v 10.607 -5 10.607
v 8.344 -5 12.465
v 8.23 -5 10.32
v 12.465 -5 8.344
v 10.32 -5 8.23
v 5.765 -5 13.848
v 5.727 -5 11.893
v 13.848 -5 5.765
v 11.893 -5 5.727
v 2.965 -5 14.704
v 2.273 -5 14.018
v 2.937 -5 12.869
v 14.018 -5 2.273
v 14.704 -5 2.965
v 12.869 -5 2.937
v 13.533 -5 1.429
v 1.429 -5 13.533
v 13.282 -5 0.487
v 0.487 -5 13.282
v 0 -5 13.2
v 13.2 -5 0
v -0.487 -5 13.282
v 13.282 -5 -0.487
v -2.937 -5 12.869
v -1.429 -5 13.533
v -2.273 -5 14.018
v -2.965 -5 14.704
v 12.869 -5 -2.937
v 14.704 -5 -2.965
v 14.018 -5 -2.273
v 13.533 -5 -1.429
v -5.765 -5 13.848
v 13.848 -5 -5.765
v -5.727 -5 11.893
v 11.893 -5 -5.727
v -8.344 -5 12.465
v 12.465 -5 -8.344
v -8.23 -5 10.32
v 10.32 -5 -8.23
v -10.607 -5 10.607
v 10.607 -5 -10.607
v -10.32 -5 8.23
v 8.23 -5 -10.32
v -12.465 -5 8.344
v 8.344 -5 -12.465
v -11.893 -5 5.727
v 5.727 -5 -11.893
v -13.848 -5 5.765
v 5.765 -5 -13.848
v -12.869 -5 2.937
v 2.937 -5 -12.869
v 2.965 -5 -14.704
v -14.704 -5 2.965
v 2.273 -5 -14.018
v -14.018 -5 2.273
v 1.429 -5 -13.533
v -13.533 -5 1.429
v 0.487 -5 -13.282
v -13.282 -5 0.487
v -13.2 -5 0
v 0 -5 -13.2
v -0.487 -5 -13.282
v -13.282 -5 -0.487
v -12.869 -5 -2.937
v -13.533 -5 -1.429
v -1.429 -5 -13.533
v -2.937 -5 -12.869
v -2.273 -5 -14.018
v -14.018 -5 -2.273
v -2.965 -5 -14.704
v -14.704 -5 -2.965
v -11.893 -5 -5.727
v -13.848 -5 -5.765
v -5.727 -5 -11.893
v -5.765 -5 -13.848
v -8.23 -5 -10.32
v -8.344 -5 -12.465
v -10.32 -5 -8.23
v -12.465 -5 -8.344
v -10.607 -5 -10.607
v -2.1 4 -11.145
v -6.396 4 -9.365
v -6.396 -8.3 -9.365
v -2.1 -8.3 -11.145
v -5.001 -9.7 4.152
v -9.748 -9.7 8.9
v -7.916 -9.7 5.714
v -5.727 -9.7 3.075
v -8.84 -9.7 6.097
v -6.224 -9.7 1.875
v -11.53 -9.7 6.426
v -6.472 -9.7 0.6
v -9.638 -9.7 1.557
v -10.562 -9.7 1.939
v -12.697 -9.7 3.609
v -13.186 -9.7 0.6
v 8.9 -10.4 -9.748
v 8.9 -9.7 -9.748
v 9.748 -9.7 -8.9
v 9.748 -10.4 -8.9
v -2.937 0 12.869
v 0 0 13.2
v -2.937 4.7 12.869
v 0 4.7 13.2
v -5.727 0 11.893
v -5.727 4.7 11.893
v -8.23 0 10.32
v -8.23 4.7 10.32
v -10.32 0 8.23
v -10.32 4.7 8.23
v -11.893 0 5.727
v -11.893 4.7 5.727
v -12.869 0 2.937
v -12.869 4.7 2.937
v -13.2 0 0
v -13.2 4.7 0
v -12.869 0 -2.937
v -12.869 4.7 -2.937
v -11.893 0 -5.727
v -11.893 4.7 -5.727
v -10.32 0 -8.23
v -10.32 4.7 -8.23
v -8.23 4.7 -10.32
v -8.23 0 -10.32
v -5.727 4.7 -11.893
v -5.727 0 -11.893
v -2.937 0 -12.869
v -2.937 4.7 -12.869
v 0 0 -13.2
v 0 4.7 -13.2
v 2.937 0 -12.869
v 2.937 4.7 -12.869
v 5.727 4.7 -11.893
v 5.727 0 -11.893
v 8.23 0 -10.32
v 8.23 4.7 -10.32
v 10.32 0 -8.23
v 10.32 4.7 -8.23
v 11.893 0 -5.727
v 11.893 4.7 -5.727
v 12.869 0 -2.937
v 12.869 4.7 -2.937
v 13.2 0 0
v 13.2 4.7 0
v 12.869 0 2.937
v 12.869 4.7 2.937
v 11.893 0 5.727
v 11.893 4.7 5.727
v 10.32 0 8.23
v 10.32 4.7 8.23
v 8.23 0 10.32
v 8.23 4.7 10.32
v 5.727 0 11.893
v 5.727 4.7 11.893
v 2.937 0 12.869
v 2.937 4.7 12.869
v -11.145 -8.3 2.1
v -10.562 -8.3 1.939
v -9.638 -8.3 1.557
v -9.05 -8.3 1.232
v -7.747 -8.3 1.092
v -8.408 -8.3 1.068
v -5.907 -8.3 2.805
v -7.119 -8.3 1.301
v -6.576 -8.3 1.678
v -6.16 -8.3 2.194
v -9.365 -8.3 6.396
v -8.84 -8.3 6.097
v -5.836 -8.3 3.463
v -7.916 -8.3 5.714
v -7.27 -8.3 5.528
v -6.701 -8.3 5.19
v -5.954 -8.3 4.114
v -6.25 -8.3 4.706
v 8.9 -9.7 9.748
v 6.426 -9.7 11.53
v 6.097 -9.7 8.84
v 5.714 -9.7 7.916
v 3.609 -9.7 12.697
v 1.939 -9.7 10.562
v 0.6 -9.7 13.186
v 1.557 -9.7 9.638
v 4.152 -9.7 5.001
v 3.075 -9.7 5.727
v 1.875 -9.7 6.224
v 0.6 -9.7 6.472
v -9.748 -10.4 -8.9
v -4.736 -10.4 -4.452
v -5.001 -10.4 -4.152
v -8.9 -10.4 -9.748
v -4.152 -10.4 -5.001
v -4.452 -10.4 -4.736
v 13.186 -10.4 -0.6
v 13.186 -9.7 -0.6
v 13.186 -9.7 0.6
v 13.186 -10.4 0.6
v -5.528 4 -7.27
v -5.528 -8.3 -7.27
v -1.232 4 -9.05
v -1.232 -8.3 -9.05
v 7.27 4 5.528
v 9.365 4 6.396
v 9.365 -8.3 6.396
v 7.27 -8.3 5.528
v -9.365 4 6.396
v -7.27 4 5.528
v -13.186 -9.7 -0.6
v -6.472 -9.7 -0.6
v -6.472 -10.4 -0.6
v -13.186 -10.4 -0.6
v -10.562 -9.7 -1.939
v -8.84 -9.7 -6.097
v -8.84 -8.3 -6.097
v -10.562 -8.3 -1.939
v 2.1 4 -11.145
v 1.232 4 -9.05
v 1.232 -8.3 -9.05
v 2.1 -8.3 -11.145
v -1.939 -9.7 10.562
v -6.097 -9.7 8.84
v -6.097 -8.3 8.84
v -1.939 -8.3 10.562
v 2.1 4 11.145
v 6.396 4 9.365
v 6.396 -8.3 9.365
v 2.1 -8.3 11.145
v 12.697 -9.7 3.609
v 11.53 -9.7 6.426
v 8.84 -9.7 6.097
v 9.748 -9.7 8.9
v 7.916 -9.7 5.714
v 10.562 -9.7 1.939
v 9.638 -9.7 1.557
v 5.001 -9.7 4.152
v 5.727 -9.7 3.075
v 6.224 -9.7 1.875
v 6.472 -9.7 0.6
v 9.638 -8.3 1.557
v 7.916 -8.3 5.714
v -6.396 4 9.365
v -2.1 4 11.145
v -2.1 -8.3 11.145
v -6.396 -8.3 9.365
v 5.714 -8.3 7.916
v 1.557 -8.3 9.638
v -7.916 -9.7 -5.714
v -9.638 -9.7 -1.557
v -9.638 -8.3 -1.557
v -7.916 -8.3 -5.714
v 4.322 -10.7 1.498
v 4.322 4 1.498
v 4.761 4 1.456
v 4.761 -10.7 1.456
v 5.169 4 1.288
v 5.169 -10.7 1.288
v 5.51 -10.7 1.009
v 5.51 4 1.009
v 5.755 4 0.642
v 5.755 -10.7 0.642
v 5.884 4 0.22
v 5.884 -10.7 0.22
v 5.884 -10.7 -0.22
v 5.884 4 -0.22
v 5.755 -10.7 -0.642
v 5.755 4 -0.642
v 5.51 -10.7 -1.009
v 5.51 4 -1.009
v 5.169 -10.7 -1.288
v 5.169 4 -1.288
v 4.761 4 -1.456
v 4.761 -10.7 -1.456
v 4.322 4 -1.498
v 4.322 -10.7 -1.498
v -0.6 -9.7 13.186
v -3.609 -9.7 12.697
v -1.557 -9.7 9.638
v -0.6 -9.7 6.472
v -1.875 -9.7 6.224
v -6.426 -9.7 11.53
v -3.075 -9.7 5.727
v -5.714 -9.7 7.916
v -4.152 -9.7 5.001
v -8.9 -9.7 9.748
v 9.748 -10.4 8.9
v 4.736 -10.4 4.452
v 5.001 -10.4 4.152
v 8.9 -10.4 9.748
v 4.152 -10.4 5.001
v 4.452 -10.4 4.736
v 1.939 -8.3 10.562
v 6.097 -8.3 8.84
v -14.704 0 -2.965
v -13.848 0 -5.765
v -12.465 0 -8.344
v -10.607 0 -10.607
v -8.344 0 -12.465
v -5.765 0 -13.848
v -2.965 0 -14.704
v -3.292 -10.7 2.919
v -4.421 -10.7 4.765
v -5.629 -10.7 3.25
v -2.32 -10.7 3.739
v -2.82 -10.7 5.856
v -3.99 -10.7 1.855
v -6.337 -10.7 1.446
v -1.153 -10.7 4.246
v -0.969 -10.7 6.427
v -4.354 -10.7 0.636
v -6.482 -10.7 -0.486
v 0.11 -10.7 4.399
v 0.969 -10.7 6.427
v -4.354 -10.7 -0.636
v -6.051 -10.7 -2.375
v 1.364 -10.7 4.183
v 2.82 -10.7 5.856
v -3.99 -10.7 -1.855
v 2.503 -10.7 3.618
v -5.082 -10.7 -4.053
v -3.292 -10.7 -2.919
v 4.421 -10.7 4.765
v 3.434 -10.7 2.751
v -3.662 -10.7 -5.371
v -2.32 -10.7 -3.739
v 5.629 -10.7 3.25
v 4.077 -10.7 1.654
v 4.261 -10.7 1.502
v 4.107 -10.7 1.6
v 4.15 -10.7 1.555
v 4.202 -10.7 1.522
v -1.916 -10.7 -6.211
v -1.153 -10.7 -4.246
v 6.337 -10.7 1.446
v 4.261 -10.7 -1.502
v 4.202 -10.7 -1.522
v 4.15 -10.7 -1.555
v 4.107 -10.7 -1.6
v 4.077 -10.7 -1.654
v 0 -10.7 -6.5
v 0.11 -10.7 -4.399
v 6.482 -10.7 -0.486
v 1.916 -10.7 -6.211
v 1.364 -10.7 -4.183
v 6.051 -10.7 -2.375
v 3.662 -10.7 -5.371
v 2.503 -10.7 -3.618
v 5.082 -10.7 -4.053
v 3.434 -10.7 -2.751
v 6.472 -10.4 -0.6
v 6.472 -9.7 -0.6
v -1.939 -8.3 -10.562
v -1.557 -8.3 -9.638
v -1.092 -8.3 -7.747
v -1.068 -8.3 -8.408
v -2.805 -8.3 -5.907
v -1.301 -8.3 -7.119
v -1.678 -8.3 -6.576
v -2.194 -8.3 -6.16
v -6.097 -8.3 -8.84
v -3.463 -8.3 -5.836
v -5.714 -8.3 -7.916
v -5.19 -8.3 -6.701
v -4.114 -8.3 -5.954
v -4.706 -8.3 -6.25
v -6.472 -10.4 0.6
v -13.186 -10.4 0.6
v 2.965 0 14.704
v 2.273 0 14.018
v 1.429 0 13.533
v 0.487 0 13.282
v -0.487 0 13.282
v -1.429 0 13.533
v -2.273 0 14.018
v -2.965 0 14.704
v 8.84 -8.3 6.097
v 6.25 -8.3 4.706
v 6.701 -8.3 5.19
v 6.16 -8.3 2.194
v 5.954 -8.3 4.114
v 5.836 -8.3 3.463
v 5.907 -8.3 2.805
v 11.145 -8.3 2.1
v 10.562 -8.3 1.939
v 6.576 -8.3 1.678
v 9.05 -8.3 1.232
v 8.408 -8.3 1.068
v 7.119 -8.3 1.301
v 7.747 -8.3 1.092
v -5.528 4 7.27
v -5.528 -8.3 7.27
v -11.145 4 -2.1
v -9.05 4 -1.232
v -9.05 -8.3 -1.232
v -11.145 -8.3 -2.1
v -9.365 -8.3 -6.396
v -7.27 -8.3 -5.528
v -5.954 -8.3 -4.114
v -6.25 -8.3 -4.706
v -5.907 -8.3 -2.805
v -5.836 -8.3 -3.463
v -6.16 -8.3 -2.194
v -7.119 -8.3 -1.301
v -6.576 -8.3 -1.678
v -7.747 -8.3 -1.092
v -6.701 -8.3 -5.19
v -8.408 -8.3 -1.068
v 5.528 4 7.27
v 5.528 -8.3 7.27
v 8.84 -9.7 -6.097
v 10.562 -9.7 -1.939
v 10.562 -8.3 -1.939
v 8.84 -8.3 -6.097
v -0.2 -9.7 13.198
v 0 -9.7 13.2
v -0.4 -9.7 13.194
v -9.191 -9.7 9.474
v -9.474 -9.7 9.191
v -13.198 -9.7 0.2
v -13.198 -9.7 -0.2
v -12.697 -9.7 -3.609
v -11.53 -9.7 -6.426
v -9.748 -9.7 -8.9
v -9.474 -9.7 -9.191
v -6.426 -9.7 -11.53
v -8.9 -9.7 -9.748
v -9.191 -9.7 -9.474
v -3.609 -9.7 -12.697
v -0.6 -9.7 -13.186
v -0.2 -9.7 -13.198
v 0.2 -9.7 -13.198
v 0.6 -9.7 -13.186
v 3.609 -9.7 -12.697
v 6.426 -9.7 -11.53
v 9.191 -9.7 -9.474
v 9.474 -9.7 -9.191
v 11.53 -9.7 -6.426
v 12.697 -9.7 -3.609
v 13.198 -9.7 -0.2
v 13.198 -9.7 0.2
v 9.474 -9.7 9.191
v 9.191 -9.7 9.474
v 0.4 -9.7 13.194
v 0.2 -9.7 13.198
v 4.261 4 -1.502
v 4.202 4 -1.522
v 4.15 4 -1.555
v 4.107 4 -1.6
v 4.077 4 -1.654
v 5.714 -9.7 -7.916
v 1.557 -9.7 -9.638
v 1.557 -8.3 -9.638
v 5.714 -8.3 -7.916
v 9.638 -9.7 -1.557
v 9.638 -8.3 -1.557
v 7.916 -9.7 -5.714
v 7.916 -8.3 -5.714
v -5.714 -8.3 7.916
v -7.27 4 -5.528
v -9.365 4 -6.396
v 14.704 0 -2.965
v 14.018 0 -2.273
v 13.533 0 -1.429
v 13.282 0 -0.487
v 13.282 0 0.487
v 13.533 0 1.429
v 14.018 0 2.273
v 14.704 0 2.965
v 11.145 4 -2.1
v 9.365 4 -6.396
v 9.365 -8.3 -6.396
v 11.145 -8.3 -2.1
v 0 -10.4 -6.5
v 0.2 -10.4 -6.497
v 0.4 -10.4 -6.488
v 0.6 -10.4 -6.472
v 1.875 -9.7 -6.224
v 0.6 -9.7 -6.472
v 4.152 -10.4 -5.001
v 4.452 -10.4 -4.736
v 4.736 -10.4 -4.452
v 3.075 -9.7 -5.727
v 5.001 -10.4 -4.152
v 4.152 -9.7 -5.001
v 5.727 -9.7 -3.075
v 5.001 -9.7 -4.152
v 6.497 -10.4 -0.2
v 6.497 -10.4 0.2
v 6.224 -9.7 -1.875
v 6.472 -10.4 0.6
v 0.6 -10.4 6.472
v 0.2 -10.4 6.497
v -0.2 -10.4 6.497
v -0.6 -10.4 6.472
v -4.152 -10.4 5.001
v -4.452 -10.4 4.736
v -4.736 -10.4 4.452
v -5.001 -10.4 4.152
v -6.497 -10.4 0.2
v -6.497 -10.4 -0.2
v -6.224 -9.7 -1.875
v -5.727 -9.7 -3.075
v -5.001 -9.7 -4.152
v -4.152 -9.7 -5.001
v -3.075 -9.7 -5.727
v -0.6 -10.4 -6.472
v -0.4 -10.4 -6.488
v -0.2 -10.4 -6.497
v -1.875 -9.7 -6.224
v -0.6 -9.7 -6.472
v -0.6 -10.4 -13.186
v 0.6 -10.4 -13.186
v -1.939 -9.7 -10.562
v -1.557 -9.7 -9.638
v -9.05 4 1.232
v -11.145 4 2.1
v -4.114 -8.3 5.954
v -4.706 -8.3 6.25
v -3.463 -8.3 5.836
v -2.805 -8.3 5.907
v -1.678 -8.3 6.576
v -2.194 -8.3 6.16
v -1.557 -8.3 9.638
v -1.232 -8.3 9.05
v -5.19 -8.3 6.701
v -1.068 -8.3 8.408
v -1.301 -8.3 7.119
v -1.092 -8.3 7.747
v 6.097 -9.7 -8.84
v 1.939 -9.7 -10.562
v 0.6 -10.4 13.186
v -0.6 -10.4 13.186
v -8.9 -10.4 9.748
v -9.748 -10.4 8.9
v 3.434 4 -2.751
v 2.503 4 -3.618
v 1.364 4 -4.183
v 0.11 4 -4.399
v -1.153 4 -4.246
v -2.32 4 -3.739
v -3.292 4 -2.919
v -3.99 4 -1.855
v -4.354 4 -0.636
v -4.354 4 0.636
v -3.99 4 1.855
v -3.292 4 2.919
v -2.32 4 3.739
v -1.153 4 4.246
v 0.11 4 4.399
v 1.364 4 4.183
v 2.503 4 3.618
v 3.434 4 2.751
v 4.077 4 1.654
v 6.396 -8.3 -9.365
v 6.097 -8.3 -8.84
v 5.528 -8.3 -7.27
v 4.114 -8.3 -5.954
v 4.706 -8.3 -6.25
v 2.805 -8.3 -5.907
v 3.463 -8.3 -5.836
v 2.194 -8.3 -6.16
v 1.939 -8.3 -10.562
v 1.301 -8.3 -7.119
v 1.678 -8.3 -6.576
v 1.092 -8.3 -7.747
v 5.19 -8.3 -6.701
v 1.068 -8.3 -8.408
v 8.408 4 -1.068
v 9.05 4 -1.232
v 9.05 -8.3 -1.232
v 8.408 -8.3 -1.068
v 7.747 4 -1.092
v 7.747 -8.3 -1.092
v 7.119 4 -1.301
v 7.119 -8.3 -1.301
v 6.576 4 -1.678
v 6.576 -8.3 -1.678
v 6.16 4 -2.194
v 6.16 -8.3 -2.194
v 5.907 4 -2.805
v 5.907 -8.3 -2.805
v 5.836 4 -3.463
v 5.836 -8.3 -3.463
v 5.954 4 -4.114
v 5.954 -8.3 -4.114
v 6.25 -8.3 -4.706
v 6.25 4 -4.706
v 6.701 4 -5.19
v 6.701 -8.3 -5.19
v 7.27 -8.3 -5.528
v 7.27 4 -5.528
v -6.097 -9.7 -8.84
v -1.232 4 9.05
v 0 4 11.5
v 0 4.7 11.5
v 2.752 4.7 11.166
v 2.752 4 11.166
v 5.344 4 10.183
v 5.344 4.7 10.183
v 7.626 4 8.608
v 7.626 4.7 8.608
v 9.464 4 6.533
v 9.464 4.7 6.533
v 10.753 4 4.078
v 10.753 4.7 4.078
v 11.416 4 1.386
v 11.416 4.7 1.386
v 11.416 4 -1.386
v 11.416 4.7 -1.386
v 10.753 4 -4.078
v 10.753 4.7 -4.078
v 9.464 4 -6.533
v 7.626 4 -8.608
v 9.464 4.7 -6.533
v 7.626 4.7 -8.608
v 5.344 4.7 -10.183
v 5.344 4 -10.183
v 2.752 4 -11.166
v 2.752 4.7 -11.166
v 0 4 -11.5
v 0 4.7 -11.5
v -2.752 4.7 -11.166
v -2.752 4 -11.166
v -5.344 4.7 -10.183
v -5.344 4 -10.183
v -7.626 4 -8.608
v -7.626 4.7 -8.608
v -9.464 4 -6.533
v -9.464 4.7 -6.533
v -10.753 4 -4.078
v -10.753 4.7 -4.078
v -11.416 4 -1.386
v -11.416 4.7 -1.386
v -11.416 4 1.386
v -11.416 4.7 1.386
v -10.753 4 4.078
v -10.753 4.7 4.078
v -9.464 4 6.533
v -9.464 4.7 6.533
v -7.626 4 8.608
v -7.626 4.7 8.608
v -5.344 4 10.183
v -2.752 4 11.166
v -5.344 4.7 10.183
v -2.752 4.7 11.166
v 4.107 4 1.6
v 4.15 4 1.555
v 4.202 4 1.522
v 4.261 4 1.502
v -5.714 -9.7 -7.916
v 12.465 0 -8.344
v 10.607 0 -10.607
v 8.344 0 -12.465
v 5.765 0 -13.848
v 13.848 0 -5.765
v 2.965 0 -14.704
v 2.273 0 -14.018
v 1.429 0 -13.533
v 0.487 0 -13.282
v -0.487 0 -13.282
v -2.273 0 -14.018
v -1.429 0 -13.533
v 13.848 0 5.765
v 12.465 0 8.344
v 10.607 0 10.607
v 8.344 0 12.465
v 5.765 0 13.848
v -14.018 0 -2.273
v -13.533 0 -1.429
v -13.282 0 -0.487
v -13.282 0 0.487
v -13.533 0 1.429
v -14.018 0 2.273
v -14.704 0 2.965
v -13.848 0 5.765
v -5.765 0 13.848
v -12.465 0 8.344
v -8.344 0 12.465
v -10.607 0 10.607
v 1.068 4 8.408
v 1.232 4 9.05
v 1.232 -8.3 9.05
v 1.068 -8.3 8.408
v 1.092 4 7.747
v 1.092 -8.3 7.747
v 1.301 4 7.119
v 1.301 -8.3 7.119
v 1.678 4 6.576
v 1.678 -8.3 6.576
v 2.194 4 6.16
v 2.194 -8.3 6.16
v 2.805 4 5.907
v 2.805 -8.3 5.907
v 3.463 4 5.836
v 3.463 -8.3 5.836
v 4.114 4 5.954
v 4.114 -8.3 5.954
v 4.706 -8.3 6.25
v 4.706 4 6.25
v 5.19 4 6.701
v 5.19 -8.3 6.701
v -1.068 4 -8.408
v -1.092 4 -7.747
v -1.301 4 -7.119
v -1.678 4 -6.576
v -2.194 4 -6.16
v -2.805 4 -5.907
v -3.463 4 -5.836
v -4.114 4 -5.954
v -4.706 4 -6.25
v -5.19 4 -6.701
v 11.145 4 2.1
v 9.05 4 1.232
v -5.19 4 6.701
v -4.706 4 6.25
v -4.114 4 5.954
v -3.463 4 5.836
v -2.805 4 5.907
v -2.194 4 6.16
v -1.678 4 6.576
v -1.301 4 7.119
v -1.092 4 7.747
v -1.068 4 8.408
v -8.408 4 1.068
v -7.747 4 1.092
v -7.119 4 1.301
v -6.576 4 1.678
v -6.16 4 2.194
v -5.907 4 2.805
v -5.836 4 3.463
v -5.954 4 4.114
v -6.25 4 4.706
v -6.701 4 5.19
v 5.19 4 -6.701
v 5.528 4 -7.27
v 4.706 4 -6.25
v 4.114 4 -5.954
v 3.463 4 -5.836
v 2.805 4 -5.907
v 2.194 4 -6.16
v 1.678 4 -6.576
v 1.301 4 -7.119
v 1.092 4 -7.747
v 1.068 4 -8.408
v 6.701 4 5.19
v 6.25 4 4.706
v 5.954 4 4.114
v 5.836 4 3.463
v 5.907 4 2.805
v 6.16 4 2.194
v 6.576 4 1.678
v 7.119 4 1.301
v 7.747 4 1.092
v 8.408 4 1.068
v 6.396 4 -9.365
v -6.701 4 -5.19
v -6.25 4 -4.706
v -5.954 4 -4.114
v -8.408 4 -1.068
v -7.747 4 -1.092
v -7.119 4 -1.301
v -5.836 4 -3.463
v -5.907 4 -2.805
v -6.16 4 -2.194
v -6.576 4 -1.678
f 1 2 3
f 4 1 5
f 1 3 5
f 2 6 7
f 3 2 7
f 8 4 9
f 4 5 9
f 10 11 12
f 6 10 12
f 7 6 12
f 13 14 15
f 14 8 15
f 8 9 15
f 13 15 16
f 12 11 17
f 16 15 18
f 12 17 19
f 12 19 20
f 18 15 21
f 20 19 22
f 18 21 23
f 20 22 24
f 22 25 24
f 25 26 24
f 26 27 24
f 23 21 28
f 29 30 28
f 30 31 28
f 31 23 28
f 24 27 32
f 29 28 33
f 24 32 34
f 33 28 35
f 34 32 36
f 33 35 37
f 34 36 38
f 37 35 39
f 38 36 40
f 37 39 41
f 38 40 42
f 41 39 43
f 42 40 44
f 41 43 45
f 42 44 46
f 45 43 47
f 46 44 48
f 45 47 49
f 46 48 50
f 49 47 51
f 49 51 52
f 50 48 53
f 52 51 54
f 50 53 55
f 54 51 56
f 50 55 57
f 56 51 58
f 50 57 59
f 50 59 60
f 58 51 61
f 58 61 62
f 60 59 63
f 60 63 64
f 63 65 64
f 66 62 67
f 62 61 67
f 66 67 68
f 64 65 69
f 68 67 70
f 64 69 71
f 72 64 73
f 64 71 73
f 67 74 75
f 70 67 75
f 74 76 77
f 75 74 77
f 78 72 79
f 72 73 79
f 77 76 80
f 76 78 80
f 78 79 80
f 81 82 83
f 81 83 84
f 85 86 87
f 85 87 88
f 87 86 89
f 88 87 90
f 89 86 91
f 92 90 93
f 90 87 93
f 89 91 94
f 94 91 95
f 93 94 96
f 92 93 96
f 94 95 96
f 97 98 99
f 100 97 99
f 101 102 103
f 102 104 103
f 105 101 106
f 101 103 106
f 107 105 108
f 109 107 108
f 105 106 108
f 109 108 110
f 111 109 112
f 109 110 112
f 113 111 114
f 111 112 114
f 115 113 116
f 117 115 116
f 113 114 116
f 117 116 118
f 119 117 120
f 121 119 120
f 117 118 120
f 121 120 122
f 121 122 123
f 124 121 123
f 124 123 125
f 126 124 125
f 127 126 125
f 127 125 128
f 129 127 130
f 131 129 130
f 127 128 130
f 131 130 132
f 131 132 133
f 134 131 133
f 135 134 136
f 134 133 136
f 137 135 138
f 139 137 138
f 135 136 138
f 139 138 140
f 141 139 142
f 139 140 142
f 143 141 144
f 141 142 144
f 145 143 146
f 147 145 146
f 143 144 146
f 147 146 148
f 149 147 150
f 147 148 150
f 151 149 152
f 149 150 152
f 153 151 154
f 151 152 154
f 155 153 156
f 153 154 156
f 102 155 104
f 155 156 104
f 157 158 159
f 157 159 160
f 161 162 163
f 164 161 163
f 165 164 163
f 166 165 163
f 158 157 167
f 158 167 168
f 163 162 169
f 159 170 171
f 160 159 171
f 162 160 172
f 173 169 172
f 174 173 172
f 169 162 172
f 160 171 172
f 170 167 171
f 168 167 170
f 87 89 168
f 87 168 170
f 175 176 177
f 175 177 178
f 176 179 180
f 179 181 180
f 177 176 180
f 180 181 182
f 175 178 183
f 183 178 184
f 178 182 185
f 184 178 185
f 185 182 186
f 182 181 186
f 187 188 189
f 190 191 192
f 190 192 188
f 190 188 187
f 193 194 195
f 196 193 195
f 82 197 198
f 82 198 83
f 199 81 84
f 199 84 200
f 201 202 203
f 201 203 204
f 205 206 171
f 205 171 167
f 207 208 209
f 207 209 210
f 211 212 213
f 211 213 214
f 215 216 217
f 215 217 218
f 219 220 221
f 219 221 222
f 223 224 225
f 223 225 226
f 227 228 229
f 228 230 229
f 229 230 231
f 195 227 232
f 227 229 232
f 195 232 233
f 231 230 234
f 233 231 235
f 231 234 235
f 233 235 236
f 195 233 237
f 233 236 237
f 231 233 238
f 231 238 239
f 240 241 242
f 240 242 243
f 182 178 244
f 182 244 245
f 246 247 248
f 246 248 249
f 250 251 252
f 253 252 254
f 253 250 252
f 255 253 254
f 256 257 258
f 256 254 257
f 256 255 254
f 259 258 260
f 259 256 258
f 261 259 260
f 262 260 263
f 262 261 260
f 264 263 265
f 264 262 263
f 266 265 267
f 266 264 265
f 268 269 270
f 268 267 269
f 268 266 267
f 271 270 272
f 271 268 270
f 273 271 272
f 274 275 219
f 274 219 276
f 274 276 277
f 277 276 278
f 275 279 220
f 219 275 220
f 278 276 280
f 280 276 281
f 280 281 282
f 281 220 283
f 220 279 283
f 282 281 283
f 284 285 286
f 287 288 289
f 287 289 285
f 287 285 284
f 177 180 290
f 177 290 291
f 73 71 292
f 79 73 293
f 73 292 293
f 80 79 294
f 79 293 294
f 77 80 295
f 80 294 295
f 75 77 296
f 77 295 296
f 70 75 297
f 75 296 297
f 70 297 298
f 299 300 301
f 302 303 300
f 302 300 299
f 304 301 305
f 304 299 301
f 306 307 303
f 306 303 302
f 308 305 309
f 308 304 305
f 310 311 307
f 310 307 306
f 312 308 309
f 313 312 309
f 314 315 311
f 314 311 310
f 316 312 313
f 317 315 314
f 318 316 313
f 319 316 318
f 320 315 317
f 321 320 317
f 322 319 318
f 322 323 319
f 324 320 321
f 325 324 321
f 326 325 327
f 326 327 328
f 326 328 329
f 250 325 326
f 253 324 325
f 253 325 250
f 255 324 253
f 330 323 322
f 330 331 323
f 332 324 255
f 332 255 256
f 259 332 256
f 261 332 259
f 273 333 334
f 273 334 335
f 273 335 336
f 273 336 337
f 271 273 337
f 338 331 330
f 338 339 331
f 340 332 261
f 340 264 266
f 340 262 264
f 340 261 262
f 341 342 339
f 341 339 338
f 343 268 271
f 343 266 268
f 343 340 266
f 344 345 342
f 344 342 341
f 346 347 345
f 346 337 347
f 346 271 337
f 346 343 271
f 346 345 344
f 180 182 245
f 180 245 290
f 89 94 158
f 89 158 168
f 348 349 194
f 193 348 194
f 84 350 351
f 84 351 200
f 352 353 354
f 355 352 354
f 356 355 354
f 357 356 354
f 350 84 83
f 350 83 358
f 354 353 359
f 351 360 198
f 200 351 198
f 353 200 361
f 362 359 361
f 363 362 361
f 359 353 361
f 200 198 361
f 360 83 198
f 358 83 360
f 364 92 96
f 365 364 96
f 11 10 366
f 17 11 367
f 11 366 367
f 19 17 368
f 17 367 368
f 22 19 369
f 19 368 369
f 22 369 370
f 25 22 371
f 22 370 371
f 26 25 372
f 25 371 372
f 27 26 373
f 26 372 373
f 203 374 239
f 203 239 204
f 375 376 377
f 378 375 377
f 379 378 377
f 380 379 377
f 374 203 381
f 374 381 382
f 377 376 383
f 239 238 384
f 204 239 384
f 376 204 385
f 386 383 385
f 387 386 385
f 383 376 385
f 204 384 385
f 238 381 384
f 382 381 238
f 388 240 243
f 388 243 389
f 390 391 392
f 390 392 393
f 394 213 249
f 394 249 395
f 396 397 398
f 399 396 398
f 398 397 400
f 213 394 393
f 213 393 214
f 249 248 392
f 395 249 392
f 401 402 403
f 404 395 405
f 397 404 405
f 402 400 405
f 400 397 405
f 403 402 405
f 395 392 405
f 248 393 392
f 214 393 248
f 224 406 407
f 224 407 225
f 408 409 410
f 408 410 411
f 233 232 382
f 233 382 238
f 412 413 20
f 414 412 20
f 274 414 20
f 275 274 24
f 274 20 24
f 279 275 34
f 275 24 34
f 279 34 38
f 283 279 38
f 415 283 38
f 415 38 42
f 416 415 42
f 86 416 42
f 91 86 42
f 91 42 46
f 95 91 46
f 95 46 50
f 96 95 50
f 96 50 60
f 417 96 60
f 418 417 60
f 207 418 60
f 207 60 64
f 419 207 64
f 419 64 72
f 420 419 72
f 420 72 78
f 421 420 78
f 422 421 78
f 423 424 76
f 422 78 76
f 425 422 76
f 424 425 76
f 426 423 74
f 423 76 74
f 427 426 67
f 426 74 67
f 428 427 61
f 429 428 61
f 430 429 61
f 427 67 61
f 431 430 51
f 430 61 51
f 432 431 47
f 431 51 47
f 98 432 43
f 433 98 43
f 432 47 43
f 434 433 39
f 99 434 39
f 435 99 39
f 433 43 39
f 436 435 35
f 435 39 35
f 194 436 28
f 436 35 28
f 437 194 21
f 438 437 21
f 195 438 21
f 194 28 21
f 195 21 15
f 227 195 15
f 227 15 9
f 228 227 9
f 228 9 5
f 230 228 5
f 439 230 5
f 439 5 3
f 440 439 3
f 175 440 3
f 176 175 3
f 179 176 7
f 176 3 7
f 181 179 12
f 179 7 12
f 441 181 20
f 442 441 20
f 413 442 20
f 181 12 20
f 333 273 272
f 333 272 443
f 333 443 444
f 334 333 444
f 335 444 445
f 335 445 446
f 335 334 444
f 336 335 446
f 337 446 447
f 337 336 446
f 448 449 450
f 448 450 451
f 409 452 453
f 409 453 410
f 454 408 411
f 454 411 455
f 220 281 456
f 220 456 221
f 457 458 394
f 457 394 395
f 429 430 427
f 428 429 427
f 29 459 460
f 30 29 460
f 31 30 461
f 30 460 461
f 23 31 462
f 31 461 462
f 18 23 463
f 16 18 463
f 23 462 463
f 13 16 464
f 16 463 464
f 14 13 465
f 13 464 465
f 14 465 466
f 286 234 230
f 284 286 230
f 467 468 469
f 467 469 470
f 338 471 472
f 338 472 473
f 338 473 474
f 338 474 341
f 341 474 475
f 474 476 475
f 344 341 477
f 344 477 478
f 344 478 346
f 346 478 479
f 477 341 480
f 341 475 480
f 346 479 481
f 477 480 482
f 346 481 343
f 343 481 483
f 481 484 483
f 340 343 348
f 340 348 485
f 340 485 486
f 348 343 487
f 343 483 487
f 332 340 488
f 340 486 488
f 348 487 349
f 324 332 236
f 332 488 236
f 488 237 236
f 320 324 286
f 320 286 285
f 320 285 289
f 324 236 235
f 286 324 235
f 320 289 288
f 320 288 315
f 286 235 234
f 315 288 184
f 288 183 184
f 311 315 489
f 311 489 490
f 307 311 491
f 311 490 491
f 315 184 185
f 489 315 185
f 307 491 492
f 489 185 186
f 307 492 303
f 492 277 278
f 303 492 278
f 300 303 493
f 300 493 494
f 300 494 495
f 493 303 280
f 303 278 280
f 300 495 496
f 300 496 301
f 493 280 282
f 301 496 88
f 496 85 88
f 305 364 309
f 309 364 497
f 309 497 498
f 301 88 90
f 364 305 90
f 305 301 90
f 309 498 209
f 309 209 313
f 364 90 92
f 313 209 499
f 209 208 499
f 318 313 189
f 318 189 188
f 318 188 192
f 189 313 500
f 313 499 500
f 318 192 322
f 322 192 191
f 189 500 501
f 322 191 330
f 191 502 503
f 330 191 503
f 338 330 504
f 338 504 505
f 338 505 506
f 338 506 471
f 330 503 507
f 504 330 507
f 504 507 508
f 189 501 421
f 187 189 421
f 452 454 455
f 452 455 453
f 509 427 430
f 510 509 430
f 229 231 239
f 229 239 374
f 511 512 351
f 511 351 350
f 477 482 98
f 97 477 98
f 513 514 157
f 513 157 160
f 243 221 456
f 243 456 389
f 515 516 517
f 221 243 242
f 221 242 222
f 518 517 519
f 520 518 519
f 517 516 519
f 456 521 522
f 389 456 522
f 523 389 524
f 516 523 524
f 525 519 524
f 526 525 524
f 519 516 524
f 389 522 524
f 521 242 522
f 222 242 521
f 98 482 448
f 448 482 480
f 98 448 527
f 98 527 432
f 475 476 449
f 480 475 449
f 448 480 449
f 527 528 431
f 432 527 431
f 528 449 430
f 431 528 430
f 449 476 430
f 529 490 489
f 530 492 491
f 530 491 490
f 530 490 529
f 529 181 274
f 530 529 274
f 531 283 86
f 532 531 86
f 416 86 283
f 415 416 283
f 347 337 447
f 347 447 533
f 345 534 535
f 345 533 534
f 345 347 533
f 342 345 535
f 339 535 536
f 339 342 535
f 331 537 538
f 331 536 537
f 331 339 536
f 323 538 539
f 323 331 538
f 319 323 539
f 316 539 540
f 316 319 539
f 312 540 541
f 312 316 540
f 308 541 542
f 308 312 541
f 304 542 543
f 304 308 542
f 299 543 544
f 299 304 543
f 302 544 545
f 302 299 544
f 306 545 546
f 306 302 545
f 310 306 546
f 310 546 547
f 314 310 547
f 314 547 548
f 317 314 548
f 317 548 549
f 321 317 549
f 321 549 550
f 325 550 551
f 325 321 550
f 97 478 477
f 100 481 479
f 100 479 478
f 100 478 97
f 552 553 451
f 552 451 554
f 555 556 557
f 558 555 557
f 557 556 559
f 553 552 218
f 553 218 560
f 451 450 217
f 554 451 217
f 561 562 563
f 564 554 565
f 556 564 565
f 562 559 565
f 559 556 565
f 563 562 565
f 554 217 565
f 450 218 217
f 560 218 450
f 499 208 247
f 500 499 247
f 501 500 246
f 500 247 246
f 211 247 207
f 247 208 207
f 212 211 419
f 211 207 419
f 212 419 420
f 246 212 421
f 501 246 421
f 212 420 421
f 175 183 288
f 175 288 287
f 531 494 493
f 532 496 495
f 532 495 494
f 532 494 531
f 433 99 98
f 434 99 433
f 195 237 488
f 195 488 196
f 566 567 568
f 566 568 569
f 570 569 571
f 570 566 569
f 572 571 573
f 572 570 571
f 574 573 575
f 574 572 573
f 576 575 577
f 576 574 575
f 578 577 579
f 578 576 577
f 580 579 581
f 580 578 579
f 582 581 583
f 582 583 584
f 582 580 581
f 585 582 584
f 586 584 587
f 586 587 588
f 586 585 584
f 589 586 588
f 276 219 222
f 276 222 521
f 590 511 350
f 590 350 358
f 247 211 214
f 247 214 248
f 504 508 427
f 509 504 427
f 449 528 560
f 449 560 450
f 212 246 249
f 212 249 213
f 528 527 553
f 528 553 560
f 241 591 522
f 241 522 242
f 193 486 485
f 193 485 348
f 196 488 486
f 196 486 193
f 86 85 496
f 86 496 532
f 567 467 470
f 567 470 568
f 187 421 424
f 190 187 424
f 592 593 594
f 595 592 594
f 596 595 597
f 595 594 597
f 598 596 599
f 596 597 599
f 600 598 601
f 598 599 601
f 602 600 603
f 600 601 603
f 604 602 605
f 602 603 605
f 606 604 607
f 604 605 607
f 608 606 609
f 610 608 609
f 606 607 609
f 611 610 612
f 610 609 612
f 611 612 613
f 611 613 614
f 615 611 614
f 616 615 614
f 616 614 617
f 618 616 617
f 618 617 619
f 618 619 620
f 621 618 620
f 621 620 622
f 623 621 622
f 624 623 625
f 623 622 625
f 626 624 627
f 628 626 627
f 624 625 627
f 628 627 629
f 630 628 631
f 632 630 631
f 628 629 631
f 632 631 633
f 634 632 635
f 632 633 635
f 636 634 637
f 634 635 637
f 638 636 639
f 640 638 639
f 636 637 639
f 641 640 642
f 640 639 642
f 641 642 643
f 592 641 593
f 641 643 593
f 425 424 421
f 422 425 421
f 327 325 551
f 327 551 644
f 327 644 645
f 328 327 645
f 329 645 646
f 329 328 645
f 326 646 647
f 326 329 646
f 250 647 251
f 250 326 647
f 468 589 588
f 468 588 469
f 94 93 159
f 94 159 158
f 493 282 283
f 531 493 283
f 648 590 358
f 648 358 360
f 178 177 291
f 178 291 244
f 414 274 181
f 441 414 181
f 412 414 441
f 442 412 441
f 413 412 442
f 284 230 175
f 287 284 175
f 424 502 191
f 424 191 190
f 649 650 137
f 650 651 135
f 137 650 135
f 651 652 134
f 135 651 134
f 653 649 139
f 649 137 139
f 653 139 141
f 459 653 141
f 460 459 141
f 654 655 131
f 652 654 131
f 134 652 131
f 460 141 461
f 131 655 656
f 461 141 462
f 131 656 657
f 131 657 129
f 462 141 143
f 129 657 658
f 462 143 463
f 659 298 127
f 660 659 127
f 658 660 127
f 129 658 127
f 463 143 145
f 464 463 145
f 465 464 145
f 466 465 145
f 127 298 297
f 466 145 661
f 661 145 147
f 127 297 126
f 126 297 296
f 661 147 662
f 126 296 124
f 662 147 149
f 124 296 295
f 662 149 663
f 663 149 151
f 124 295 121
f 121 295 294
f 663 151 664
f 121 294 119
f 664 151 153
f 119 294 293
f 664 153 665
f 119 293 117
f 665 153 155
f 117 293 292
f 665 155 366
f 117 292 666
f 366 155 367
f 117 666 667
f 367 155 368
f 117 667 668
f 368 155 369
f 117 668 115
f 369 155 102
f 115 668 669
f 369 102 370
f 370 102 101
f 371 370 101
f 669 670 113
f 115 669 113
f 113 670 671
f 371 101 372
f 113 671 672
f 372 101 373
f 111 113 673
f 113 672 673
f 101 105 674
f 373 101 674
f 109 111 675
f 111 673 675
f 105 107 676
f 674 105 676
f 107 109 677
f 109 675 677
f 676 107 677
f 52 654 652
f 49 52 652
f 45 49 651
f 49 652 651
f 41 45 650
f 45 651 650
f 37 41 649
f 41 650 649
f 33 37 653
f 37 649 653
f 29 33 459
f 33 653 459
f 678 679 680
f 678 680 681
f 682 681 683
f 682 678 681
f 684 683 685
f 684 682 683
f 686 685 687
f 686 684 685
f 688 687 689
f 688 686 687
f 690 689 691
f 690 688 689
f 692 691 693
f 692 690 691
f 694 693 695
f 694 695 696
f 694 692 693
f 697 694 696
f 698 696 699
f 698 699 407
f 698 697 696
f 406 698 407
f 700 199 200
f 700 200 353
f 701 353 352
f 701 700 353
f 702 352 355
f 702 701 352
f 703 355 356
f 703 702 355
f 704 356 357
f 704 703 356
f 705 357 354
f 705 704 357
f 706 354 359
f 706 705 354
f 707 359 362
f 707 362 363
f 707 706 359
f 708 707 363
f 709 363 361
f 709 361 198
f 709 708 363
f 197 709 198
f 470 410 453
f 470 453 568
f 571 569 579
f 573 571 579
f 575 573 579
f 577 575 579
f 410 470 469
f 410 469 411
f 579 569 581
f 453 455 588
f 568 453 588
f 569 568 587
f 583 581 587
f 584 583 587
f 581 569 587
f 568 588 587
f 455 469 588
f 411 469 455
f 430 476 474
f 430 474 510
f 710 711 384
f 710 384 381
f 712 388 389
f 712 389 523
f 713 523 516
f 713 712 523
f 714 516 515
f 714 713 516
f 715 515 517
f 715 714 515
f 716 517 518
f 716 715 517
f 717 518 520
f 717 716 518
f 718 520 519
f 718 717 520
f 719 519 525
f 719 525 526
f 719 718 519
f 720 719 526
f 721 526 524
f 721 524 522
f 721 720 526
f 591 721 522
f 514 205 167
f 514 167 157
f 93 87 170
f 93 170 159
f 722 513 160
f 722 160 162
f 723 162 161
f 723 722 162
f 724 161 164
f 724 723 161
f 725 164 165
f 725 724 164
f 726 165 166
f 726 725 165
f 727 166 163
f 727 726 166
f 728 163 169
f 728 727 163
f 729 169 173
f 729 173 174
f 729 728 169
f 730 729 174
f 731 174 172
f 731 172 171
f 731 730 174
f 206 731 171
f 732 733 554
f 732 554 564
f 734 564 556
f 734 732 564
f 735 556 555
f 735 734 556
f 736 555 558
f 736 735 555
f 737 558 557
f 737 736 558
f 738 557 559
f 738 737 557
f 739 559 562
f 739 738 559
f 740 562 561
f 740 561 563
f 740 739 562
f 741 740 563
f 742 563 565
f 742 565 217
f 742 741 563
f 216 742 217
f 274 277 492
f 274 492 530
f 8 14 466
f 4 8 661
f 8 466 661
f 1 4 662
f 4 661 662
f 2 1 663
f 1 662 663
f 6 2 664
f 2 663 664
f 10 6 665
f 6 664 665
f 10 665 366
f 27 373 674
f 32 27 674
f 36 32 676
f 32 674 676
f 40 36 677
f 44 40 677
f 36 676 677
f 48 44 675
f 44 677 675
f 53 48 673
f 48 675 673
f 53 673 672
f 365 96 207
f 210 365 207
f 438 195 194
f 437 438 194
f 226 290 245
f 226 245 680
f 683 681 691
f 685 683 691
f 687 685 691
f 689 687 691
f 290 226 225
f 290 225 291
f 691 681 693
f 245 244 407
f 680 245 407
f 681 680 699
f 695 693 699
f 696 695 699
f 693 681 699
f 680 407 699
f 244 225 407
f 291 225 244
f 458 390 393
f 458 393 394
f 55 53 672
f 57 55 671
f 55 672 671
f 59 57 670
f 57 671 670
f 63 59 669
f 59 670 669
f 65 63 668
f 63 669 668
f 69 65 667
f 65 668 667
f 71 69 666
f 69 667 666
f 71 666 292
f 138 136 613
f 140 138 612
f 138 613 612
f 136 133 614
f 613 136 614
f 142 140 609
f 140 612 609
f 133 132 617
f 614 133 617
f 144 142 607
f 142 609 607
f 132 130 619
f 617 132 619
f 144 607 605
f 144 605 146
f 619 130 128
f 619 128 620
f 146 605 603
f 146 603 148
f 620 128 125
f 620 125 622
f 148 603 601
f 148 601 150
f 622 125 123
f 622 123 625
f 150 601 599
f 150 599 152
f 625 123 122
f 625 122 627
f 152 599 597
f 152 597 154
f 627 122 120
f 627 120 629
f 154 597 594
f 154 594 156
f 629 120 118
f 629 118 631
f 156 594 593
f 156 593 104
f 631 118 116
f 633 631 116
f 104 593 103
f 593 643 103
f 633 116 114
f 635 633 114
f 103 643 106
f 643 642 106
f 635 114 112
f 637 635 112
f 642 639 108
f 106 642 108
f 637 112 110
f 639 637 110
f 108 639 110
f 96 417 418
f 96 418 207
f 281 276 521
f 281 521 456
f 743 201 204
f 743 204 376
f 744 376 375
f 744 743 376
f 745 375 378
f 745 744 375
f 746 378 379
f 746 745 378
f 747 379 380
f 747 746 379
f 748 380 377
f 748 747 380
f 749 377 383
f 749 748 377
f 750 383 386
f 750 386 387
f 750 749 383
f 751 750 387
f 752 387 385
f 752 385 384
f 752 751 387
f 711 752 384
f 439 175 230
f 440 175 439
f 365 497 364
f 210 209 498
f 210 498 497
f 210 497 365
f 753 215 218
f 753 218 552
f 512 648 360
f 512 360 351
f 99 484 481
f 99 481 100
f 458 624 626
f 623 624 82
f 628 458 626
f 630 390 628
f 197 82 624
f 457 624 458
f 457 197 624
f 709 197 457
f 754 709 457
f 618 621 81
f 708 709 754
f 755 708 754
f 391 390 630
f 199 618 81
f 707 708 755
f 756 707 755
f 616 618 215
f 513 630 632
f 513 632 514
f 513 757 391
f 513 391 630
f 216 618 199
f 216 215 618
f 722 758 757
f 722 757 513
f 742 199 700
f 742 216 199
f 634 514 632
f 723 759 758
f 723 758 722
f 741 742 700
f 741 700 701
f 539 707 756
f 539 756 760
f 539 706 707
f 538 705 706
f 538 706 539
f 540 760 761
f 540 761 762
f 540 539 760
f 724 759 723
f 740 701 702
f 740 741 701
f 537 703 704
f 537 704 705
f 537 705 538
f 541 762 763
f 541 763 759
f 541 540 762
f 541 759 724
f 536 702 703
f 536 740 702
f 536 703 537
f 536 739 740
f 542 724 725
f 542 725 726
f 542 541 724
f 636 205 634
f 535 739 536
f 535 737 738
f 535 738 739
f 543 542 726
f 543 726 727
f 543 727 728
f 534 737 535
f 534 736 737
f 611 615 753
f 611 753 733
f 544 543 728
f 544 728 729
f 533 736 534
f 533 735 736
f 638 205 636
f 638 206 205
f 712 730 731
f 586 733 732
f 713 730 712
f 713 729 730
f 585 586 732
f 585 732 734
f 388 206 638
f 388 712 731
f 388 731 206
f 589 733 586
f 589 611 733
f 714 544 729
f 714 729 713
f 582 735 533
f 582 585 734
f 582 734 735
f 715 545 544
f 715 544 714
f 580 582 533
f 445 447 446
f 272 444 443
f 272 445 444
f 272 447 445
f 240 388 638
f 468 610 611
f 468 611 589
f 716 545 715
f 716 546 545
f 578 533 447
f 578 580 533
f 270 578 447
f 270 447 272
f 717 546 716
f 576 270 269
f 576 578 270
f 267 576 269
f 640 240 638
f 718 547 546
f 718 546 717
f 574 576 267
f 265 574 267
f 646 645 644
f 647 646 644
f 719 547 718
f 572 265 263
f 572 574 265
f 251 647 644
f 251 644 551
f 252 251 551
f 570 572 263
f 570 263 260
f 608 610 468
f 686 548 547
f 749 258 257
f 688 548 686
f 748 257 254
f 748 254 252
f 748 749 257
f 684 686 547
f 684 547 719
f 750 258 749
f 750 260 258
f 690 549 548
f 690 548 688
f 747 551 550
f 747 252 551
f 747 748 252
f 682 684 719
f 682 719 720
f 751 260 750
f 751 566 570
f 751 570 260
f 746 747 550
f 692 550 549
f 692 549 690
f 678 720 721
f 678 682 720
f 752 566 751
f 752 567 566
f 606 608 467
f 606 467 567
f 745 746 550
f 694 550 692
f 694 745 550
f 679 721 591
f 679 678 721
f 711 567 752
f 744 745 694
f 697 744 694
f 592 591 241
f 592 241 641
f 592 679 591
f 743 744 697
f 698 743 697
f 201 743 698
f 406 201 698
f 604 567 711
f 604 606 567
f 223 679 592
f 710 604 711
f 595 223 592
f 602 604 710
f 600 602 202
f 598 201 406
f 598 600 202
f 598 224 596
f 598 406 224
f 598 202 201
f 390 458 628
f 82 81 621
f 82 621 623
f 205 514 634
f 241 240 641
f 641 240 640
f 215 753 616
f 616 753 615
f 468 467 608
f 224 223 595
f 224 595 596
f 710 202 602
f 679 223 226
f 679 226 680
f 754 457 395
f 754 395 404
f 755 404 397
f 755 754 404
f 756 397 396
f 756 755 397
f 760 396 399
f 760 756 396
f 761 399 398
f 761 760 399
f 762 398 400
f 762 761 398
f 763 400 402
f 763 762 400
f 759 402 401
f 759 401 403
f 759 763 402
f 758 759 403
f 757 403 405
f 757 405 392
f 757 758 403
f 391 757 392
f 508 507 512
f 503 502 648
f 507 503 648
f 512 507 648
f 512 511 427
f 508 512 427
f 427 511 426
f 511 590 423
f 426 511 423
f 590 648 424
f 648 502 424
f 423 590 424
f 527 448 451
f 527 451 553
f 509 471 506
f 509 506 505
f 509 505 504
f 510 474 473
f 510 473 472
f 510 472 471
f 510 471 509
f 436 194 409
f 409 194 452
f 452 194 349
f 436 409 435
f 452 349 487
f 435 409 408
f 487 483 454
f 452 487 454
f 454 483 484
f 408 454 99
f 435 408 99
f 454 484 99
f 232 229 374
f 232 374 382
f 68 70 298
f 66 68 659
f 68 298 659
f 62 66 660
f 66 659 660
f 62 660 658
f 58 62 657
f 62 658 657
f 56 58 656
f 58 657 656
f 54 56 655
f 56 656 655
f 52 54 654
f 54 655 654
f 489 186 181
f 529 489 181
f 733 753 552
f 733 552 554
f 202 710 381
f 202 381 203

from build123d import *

# Parameters (mm, degrees)
SKETCH2_R           = 11.5
EXTRUDE1_DEPTH      = 0.7
SKETCH4_R           = 6.5
EXTRUDE3_DEPTH      = 1
SKETCH5_W           = 6.714108136
SKETCH5_H           = 1.2
EXTRUDE4_DEPTH      = 0.7
EXTRUDE2_DEPTH      = 24.758998295
EXTRUDE2_DEPTH_BACK = 24.758998295
CIRPATTERN1_COUNT   = 8
EXTRUDE5_DEPTH      = 12.3
EXTRUDE6_DEPTH      = 26.639032743
CIRPATTERN2_COUNT   = 8
SKETCH10_R          = 3.75
EXTRUDE7_DEPTH      = 12.3
CIRPATTERN3_COUNT   = 4


with BuildPart() as part:
    # Sketch1 → Revolve1 (revolve)
    with BuildSketch(Plane.XY):
        Polygon((-13.2, 0), (-13.2, 4.7), (0, 4.7), (0, -9.7), (-13.2, -9.7), (-13.2, -5), (-15, -5), (-15, 0), align=None)
    revolve(axis=Axis((0, 20.644864938, 0), (0, -1, 0)))

    # Sketch2 → Extrude1 (cut)
    with BuildSketch(Plane(origin=(0, 4.7, 0), x_dir=(1, 0, 0), z_dir=(0, 1, 0))):
        Circle(SKETCH2_R)
    extrude(amount=-EXTRUDE1_DEPTH, mode=Mode.SUBTRACT)

    # Sketch4 → Extrude3 (add)
    with BuildSketch(Plane.XZ.offset(9.7)):
        Circle(SKETCH4_R)
    extrude(amount=EXTRUDE3_DEPTH)

    # Sketch5 → Extrude4 (add)
    with BuildSketch(Plane.XZ.offset(9.7)):
        with Locations((9.829302518, 0)):
            Rectangle(SKETCH5_W, SKETCH5_H)
    extrude4 = extrude(amount=EXTRUDE4_DEPTH)

    # Sketch3 → Extrude2 (cut, two sides: drawn at the far end of the back side and taken through both)
    with BuildSketch(Plane(origin=(0, 0, 0), x_dir=(1, 0, 0), z_dir=(0, 1, 0)).offset(-EXTRUDE2_DEPTH_BACK)):
        with BuildLine():
            ThreePointArc((4.077419355, 1.653678144), (-4.4, 0), (4.077419355, -1.653678144))
            ThreePointArc((4.077419355, -1.653678144), (4.17486489, -1.536726305), (4.322077922, -1.497974683))
            ThreePointArc((4.322077922, -1.497974683), (5.9, 0), (4.322077922, 1.497974683))
            ThreePointArc((4.322077922, 1.497974683), (4.17486489, 1.536726305), (4.077419355, 1.653678144))
        make_face()
    extrude(amount=EXTRUDE2_DEPTH + EXTRUDE2_DEPTH_BACK, mode=Mode.SUBTRACT)

    # CirPattern1: Extrude4 ×8 about axis
    cirpattern1_axis = Axis((0, 55, 0), (0, -1, 0))
    for i in range(1, CIRPATTERN1_COUNT):
        add(extrude4.rotate(cirpattern1_axis, i * 360 / CIRPATTERN1_COUNT))

    # Sketch7 → Extrude5 (cut)
    with BuildSketch(Plane(origin=(0, 4, 0), x_dir=(1, 0, 0), z_dir=(0, 1, 0))):
        with BuildLine():
            Line((9.365323831, 6.395806012), (11.144801791, 2.099766186))
            Line((11.144801791, 2.099766186), (9.04959703, 1.231903958))
            ThreePointArc((9.04959703, 1.231903958), (6.011838137, 2.490184891), (7.27011907, 5.527943784))
            Line((7.27011907, 5.527943784), (9.365323831, 6.395806012))
        make_face()
    extrude5 = extrude(amount=-EXTRUDE5_DEPTH, mode=Mode.SUBTRACT)

    # Sketch9 → Extrude6 (cut, through all)
    with BuildSketch(Plane.XZ.offset(9.7)):
        Polygon((10.561772814, -1.939447092), (8.839697369, -6.096904988), (7.915817836, -5.714221556), (9.637893282, -1.556763659), align=None)
    extrude6 = extrude(amount=-EXTRUDE6_DEPTH, mode=Mode.SUBTRACT)

    # CirPattern2: Extrude5, Extrude6 ×8 about axis
    cirpattern2_axis = Axis((0, 55, 0), (0, -1, 0))
    add([extrude5.rotate(cirpattern2_axis, i * 360 / CIRPATTERN2_COUNT) for i in range(1, CIRPATTERN2_COUNT)], mode=Mode.SUBTRACT)
    add([extrude6.rotate(cirpattern2_axis, i * 360 / CIRPATTERN2_COUNT) for i in range(1, CIRPATTERN2_COUNT)], mode=Mode.SUBTRACT)

    # Sketch10 → Extrude7 (cut)
    with BuildSketch(Plane(origin=(0, 0, 0), x_dir=(1, 0, 0), z_dir=(0, 1, 0))):
        with Locations((17, 0)):
            Circle(SKETCH10_R)
    extrude7 = extrude(amount=-EXTRUDE7_DEPTH, mode=Mode.SUBTRACT)

    # CirPattern3: Extrude7 ×4 about axis
    cirpattern3_axis = Axis((0, 55, 0), (0, -1, 0))
    for i in range(1, CIRPATTERN3_COUNT):
        add(extrude7.rotate(cirpattern3_axis, i * 360 / CIRPATTERN3_COUNT), mode=Mode.SUBTRACT)


solid = part.part
